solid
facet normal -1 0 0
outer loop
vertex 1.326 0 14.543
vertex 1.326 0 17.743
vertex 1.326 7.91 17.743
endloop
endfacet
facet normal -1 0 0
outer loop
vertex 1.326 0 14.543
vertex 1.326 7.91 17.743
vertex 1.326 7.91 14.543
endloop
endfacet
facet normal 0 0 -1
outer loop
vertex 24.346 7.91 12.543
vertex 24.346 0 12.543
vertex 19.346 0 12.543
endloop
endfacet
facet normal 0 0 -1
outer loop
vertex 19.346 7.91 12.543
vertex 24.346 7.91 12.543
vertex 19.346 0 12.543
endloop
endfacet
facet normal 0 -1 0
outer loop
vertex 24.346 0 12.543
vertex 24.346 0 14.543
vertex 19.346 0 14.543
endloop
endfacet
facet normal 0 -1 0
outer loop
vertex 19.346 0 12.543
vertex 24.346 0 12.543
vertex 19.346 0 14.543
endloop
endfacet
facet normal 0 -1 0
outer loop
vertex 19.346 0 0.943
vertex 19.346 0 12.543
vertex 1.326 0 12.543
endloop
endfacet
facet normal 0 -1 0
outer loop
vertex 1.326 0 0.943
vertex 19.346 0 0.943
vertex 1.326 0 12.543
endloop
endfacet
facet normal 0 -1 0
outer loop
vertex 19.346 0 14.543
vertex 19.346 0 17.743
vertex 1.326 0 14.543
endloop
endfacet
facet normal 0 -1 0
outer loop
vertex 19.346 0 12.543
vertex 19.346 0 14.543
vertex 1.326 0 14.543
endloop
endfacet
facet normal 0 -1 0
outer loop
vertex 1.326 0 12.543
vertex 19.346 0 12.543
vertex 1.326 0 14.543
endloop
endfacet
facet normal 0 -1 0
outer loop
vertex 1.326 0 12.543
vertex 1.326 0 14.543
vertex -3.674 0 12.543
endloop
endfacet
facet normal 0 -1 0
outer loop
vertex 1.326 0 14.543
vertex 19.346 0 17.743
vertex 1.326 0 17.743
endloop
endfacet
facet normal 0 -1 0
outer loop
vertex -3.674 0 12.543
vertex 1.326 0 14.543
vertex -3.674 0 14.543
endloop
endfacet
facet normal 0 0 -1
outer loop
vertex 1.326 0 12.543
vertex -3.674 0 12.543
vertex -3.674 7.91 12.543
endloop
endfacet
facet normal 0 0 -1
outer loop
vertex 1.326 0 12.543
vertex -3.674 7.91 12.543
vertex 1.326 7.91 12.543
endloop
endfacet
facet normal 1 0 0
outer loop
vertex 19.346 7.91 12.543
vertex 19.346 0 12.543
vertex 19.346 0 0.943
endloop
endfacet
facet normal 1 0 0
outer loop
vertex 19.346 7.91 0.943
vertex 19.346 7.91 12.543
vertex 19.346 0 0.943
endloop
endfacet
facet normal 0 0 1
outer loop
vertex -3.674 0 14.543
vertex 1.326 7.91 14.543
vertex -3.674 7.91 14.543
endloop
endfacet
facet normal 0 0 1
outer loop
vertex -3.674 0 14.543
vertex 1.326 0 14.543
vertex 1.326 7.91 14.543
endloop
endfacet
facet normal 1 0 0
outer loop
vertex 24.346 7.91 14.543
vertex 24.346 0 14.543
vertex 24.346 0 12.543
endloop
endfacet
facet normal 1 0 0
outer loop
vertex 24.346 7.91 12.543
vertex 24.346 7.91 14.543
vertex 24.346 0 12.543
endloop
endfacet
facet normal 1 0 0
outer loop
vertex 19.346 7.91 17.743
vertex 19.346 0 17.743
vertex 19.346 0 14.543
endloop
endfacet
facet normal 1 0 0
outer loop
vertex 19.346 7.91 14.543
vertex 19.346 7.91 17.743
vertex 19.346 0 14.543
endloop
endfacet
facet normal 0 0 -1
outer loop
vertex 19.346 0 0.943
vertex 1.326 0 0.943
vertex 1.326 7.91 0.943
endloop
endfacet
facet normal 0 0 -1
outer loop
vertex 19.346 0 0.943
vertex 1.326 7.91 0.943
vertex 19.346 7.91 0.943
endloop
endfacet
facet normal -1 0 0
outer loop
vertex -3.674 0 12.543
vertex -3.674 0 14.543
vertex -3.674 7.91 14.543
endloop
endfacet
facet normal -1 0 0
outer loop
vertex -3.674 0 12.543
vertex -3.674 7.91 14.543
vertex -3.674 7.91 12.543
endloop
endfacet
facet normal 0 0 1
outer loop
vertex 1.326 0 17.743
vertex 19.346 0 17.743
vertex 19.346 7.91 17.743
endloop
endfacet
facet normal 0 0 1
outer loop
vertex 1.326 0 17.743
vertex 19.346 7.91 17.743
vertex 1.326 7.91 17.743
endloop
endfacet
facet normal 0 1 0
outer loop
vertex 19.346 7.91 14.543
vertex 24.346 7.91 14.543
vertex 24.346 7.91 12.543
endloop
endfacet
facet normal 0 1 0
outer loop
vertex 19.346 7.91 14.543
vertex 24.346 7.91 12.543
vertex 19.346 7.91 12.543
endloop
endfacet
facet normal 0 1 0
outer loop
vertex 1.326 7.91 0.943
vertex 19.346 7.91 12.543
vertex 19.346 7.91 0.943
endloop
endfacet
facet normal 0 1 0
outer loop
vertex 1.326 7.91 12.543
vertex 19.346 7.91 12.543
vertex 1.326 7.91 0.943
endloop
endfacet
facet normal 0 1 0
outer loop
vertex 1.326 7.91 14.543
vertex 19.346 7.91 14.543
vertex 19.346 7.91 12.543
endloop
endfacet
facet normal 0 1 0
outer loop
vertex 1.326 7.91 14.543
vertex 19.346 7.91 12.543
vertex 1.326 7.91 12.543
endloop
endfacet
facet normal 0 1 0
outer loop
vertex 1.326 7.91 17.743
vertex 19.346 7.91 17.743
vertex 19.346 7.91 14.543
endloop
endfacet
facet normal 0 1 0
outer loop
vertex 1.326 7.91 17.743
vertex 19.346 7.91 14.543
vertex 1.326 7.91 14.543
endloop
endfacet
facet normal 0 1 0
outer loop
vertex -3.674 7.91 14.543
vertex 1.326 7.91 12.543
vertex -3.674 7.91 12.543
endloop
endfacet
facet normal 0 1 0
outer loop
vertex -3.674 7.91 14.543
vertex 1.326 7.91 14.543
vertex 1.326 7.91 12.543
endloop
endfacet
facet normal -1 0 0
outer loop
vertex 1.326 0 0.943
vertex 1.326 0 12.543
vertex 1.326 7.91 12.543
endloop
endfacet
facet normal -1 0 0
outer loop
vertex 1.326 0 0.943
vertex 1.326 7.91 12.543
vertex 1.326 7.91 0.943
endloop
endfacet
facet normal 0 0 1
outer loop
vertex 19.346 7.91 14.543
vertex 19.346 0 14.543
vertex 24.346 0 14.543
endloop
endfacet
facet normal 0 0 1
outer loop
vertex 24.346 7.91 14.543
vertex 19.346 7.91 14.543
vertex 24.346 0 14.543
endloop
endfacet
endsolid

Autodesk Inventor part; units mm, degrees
ref_plane "YZ Plane" through (0, 0, 0) normal (1, 0, 0) x (0, 1, 0)
ref_plane "XZ Plane" through (0, 0, 0) normal (0, 1, 0) x (-1, 0, 0)
ref_plane "XY Plane" through (0, 0, 0) normal (0, 0, 1) x (1, 0, 0)
sketch "Sketch1" plane through (0, 0, 0) normal (0, 1, 0) x (-1, 0, 0)
  line L0 (-19.3459, 17.7433) -> (-1.3259, 17.7433)
  line L1 (-1.3259, 0.9433) -> (-19.3459, 0.9433)
  line L2 (-19.3459, 14.5433) -> (-24.3459, 14.5433)
  line L3 (-24.3459, 14.5433) -> (-24.3459, 12.5433)
  line L4 (-24.3459, 12.5433) -> (-19.3459, 12.5433)
  line L5 (-19.3459, 17.7433) -> (-19.3459, 14.5433)
  line L6 (-19.3459, 12.5433) -> (-19.3459, 0.9433)
  line L7 (-1.3259, 17.7433) -> (-1.3259, 14.5433)
  line L8 (-1.3259, 14.5433) -> (3.6741, 14.5433)
  line L9 (3.6741, 14.5433) -> (3.6741, 12.5433)
  line L10 (3.6741, 12.5433) -> (-1.3259, 12.5433)
  line L11 (-1.3259, 12.5433) -> (-1.3259, 0.9433)
  point P0 (0, 0)
  point P1 (-11, -1)
  dimension "d0" = 18.02
  dimension "d1" = 16.8
  dimension "d2" = 2
  dimension "d3" = 5
  dimension "d4" = 3.2
extrude "Extrusion1" add sketch "Sketch1" along normal blind 7.91
properties part number "EMAXES9251"
